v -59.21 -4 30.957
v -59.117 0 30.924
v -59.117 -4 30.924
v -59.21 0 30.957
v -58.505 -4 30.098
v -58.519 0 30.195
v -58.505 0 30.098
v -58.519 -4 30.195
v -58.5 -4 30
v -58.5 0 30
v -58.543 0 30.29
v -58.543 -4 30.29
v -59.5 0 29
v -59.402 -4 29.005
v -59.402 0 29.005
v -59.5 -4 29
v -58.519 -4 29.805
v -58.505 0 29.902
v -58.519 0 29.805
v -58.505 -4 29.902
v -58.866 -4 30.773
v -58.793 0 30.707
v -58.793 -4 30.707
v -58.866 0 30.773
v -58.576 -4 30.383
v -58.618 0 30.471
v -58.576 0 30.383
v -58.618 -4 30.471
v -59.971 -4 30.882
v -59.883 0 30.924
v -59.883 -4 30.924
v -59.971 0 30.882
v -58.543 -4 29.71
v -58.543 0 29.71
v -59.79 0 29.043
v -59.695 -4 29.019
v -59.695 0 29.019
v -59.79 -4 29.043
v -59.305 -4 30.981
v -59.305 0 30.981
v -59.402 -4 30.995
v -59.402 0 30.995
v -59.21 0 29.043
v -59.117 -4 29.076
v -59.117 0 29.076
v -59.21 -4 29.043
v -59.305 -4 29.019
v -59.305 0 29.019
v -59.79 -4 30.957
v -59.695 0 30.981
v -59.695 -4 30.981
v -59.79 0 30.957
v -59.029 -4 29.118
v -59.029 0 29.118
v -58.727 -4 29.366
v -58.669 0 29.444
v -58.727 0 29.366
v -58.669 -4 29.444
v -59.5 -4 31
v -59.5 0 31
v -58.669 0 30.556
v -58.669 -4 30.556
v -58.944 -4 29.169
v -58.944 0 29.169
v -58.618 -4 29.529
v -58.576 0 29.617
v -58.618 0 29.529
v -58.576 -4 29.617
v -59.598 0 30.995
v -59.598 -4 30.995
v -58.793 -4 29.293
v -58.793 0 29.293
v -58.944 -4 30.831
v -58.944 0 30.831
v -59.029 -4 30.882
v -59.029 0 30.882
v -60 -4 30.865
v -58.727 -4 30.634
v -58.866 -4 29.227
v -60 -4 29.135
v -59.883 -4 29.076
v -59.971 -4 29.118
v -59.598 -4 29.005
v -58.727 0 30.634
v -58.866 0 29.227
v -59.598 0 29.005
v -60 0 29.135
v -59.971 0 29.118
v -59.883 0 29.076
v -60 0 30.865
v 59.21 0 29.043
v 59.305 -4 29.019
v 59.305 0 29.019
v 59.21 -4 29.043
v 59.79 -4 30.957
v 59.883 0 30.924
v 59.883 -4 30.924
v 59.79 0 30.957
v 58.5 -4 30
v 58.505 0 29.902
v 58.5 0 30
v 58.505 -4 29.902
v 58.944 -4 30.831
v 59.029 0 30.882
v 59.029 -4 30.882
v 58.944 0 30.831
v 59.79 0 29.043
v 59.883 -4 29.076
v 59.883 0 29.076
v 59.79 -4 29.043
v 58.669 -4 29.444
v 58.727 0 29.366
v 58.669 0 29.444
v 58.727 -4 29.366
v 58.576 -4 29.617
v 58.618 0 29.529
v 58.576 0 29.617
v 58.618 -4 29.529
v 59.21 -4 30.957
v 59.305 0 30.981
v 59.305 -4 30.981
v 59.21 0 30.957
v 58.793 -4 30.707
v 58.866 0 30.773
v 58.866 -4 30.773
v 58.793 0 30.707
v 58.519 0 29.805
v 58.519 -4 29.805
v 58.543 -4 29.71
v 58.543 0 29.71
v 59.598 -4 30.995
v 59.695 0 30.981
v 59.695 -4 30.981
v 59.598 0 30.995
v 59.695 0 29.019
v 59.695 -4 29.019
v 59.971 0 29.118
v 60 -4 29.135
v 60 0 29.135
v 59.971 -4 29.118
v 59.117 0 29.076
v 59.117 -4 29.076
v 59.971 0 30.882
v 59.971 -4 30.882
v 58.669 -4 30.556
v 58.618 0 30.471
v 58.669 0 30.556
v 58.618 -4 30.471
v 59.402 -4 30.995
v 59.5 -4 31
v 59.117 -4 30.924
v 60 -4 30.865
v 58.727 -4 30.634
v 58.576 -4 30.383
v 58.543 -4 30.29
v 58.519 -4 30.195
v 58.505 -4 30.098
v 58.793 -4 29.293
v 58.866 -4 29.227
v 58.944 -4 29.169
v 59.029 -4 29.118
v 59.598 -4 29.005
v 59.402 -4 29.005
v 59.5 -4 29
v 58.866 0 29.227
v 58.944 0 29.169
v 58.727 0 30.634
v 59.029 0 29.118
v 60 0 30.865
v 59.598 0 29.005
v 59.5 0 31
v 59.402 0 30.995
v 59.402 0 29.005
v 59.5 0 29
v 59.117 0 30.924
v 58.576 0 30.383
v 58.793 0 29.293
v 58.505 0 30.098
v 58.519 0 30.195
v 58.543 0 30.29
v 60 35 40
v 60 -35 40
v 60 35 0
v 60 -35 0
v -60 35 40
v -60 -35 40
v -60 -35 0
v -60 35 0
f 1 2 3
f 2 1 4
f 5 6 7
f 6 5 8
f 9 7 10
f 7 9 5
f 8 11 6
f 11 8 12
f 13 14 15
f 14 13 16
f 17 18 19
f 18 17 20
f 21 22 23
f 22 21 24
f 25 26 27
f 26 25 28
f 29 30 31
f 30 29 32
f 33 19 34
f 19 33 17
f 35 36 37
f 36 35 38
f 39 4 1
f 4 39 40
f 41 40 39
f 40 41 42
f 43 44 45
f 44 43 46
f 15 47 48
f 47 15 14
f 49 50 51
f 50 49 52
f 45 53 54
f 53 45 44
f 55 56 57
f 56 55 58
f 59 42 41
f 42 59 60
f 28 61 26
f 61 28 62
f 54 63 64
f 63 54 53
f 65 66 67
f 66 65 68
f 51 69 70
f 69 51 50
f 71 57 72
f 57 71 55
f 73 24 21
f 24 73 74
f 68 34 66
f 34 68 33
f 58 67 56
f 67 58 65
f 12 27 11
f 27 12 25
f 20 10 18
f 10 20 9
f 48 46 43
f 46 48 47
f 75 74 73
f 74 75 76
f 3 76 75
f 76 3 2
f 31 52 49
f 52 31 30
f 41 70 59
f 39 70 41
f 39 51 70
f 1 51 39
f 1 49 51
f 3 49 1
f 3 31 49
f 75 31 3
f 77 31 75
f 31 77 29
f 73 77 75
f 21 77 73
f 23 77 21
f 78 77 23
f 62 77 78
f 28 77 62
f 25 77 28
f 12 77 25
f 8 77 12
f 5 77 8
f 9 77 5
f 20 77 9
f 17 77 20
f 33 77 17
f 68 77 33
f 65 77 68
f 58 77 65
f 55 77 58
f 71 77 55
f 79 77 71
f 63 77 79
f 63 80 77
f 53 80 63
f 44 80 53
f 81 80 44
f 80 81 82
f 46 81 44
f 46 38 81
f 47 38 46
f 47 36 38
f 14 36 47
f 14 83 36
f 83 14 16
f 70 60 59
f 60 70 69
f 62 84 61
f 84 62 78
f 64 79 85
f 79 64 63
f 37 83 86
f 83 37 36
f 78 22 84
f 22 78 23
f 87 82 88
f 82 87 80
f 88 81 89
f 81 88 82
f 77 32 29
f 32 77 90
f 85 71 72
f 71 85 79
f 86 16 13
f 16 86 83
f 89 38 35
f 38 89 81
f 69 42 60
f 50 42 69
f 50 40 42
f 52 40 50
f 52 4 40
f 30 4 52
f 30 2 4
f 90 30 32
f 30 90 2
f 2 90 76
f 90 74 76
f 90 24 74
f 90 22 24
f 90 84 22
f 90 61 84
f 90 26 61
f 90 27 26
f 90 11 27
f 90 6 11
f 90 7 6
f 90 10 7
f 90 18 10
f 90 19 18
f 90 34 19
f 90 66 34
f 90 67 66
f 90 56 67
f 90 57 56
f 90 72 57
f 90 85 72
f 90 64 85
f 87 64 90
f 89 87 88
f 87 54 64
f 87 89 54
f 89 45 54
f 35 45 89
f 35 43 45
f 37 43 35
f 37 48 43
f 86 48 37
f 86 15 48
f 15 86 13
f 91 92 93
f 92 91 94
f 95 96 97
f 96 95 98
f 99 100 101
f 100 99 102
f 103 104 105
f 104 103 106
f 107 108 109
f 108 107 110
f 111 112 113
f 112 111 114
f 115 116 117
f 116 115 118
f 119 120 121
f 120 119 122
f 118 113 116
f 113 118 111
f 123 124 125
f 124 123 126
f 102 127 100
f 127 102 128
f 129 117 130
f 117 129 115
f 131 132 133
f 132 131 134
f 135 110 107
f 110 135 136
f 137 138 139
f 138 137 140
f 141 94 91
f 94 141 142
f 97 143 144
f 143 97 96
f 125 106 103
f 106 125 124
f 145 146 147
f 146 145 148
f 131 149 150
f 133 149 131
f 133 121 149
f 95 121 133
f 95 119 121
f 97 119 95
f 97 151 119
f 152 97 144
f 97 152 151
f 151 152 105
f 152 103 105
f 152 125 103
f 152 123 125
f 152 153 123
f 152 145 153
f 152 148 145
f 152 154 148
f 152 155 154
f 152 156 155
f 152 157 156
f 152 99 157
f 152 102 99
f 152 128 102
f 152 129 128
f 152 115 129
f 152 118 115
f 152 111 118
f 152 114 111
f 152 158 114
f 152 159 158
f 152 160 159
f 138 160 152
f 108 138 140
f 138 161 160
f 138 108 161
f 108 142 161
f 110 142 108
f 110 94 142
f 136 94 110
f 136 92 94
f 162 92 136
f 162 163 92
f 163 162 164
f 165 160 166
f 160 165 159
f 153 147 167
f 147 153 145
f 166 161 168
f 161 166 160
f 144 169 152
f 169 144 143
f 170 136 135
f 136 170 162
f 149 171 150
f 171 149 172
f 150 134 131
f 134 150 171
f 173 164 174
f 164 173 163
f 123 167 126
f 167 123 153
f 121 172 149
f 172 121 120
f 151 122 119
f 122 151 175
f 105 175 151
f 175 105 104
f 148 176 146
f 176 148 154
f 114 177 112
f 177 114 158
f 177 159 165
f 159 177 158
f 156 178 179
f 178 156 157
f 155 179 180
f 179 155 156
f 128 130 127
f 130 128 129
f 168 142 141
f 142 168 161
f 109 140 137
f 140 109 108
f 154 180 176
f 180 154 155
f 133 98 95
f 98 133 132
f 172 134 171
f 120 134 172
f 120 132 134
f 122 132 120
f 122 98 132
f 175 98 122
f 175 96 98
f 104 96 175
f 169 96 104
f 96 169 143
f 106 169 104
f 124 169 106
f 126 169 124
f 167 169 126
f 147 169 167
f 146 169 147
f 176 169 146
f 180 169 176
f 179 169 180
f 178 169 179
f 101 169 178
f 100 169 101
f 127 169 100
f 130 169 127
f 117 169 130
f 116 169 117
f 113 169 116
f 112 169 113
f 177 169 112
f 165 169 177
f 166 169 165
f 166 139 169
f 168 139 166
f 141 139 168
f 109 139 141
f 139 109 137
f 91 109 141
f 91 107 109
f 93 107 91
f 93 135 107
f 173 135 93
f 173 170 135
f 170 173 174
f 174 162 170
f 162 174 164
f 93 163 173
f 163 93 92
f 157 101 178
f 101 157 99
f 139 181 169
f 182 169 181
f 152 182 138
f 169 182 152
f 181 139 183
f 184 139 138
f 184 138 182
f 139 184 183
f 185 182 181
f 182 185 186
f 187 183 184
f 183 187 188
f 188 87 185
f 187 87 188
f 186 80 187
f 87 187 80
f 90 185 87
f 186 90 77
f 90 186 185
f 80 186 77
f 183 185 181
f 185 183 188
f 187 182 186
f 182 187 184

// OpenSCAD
// Mini horizontal gel-electrophoresis box - buffer tank
// Print orientation: tank rests on XY plane, builds up +Z

$fn = 64;

// ---- Tank dimensions ----
outer_x = 120;   // outer length (X)
outer_y = 70;    // outer width (Y)
outer_z = 40;    // outer height (Z)
wall    = 3;     // wall thickness
floor   = 3;     // floor thickness

// ---- Platform (gel tray support) ----
plat_x     = 60;   // platform length in X, centred
plat_top_z = 13;   // platform top height (10 mm above inner floor)
plat_w     = outer_y; // platform spans full inner width (Y)

// ---- Electrode holes ----
hole_d     = 2;    // hole diameter
hole_y     = 0;    // hole Y position
hole_z     = 30;   // hole Z position

// ---- Derived ----
inner_x = outer_x - 2 * wall;
inner_z = outer_z - wall;
eps     = 0.5;     // cutter overshoot

difference() {
    // Tank body
    translate([-outer_x / 2, -outer_y / 2, 0])
        cube([outer_x, outer_y, outer_z]);

    // Platform (solid, divides bottom into two chambers)
    translate([-plat_x / 2, -plat_w / 2, outer_z - floor])
        cube([plat_x, plat_w, plat_top_z - (outer_z - floor)]);

    // Electrode holes through end walls along X
    for (sx = [-1, 1])
        translate([sx * (outer_x / 2 - eps), hole_y, hole_z])
            rotate([90, 0, 0])
                cylinder(d = hole_d, h = wall + 2 * eps);
}
